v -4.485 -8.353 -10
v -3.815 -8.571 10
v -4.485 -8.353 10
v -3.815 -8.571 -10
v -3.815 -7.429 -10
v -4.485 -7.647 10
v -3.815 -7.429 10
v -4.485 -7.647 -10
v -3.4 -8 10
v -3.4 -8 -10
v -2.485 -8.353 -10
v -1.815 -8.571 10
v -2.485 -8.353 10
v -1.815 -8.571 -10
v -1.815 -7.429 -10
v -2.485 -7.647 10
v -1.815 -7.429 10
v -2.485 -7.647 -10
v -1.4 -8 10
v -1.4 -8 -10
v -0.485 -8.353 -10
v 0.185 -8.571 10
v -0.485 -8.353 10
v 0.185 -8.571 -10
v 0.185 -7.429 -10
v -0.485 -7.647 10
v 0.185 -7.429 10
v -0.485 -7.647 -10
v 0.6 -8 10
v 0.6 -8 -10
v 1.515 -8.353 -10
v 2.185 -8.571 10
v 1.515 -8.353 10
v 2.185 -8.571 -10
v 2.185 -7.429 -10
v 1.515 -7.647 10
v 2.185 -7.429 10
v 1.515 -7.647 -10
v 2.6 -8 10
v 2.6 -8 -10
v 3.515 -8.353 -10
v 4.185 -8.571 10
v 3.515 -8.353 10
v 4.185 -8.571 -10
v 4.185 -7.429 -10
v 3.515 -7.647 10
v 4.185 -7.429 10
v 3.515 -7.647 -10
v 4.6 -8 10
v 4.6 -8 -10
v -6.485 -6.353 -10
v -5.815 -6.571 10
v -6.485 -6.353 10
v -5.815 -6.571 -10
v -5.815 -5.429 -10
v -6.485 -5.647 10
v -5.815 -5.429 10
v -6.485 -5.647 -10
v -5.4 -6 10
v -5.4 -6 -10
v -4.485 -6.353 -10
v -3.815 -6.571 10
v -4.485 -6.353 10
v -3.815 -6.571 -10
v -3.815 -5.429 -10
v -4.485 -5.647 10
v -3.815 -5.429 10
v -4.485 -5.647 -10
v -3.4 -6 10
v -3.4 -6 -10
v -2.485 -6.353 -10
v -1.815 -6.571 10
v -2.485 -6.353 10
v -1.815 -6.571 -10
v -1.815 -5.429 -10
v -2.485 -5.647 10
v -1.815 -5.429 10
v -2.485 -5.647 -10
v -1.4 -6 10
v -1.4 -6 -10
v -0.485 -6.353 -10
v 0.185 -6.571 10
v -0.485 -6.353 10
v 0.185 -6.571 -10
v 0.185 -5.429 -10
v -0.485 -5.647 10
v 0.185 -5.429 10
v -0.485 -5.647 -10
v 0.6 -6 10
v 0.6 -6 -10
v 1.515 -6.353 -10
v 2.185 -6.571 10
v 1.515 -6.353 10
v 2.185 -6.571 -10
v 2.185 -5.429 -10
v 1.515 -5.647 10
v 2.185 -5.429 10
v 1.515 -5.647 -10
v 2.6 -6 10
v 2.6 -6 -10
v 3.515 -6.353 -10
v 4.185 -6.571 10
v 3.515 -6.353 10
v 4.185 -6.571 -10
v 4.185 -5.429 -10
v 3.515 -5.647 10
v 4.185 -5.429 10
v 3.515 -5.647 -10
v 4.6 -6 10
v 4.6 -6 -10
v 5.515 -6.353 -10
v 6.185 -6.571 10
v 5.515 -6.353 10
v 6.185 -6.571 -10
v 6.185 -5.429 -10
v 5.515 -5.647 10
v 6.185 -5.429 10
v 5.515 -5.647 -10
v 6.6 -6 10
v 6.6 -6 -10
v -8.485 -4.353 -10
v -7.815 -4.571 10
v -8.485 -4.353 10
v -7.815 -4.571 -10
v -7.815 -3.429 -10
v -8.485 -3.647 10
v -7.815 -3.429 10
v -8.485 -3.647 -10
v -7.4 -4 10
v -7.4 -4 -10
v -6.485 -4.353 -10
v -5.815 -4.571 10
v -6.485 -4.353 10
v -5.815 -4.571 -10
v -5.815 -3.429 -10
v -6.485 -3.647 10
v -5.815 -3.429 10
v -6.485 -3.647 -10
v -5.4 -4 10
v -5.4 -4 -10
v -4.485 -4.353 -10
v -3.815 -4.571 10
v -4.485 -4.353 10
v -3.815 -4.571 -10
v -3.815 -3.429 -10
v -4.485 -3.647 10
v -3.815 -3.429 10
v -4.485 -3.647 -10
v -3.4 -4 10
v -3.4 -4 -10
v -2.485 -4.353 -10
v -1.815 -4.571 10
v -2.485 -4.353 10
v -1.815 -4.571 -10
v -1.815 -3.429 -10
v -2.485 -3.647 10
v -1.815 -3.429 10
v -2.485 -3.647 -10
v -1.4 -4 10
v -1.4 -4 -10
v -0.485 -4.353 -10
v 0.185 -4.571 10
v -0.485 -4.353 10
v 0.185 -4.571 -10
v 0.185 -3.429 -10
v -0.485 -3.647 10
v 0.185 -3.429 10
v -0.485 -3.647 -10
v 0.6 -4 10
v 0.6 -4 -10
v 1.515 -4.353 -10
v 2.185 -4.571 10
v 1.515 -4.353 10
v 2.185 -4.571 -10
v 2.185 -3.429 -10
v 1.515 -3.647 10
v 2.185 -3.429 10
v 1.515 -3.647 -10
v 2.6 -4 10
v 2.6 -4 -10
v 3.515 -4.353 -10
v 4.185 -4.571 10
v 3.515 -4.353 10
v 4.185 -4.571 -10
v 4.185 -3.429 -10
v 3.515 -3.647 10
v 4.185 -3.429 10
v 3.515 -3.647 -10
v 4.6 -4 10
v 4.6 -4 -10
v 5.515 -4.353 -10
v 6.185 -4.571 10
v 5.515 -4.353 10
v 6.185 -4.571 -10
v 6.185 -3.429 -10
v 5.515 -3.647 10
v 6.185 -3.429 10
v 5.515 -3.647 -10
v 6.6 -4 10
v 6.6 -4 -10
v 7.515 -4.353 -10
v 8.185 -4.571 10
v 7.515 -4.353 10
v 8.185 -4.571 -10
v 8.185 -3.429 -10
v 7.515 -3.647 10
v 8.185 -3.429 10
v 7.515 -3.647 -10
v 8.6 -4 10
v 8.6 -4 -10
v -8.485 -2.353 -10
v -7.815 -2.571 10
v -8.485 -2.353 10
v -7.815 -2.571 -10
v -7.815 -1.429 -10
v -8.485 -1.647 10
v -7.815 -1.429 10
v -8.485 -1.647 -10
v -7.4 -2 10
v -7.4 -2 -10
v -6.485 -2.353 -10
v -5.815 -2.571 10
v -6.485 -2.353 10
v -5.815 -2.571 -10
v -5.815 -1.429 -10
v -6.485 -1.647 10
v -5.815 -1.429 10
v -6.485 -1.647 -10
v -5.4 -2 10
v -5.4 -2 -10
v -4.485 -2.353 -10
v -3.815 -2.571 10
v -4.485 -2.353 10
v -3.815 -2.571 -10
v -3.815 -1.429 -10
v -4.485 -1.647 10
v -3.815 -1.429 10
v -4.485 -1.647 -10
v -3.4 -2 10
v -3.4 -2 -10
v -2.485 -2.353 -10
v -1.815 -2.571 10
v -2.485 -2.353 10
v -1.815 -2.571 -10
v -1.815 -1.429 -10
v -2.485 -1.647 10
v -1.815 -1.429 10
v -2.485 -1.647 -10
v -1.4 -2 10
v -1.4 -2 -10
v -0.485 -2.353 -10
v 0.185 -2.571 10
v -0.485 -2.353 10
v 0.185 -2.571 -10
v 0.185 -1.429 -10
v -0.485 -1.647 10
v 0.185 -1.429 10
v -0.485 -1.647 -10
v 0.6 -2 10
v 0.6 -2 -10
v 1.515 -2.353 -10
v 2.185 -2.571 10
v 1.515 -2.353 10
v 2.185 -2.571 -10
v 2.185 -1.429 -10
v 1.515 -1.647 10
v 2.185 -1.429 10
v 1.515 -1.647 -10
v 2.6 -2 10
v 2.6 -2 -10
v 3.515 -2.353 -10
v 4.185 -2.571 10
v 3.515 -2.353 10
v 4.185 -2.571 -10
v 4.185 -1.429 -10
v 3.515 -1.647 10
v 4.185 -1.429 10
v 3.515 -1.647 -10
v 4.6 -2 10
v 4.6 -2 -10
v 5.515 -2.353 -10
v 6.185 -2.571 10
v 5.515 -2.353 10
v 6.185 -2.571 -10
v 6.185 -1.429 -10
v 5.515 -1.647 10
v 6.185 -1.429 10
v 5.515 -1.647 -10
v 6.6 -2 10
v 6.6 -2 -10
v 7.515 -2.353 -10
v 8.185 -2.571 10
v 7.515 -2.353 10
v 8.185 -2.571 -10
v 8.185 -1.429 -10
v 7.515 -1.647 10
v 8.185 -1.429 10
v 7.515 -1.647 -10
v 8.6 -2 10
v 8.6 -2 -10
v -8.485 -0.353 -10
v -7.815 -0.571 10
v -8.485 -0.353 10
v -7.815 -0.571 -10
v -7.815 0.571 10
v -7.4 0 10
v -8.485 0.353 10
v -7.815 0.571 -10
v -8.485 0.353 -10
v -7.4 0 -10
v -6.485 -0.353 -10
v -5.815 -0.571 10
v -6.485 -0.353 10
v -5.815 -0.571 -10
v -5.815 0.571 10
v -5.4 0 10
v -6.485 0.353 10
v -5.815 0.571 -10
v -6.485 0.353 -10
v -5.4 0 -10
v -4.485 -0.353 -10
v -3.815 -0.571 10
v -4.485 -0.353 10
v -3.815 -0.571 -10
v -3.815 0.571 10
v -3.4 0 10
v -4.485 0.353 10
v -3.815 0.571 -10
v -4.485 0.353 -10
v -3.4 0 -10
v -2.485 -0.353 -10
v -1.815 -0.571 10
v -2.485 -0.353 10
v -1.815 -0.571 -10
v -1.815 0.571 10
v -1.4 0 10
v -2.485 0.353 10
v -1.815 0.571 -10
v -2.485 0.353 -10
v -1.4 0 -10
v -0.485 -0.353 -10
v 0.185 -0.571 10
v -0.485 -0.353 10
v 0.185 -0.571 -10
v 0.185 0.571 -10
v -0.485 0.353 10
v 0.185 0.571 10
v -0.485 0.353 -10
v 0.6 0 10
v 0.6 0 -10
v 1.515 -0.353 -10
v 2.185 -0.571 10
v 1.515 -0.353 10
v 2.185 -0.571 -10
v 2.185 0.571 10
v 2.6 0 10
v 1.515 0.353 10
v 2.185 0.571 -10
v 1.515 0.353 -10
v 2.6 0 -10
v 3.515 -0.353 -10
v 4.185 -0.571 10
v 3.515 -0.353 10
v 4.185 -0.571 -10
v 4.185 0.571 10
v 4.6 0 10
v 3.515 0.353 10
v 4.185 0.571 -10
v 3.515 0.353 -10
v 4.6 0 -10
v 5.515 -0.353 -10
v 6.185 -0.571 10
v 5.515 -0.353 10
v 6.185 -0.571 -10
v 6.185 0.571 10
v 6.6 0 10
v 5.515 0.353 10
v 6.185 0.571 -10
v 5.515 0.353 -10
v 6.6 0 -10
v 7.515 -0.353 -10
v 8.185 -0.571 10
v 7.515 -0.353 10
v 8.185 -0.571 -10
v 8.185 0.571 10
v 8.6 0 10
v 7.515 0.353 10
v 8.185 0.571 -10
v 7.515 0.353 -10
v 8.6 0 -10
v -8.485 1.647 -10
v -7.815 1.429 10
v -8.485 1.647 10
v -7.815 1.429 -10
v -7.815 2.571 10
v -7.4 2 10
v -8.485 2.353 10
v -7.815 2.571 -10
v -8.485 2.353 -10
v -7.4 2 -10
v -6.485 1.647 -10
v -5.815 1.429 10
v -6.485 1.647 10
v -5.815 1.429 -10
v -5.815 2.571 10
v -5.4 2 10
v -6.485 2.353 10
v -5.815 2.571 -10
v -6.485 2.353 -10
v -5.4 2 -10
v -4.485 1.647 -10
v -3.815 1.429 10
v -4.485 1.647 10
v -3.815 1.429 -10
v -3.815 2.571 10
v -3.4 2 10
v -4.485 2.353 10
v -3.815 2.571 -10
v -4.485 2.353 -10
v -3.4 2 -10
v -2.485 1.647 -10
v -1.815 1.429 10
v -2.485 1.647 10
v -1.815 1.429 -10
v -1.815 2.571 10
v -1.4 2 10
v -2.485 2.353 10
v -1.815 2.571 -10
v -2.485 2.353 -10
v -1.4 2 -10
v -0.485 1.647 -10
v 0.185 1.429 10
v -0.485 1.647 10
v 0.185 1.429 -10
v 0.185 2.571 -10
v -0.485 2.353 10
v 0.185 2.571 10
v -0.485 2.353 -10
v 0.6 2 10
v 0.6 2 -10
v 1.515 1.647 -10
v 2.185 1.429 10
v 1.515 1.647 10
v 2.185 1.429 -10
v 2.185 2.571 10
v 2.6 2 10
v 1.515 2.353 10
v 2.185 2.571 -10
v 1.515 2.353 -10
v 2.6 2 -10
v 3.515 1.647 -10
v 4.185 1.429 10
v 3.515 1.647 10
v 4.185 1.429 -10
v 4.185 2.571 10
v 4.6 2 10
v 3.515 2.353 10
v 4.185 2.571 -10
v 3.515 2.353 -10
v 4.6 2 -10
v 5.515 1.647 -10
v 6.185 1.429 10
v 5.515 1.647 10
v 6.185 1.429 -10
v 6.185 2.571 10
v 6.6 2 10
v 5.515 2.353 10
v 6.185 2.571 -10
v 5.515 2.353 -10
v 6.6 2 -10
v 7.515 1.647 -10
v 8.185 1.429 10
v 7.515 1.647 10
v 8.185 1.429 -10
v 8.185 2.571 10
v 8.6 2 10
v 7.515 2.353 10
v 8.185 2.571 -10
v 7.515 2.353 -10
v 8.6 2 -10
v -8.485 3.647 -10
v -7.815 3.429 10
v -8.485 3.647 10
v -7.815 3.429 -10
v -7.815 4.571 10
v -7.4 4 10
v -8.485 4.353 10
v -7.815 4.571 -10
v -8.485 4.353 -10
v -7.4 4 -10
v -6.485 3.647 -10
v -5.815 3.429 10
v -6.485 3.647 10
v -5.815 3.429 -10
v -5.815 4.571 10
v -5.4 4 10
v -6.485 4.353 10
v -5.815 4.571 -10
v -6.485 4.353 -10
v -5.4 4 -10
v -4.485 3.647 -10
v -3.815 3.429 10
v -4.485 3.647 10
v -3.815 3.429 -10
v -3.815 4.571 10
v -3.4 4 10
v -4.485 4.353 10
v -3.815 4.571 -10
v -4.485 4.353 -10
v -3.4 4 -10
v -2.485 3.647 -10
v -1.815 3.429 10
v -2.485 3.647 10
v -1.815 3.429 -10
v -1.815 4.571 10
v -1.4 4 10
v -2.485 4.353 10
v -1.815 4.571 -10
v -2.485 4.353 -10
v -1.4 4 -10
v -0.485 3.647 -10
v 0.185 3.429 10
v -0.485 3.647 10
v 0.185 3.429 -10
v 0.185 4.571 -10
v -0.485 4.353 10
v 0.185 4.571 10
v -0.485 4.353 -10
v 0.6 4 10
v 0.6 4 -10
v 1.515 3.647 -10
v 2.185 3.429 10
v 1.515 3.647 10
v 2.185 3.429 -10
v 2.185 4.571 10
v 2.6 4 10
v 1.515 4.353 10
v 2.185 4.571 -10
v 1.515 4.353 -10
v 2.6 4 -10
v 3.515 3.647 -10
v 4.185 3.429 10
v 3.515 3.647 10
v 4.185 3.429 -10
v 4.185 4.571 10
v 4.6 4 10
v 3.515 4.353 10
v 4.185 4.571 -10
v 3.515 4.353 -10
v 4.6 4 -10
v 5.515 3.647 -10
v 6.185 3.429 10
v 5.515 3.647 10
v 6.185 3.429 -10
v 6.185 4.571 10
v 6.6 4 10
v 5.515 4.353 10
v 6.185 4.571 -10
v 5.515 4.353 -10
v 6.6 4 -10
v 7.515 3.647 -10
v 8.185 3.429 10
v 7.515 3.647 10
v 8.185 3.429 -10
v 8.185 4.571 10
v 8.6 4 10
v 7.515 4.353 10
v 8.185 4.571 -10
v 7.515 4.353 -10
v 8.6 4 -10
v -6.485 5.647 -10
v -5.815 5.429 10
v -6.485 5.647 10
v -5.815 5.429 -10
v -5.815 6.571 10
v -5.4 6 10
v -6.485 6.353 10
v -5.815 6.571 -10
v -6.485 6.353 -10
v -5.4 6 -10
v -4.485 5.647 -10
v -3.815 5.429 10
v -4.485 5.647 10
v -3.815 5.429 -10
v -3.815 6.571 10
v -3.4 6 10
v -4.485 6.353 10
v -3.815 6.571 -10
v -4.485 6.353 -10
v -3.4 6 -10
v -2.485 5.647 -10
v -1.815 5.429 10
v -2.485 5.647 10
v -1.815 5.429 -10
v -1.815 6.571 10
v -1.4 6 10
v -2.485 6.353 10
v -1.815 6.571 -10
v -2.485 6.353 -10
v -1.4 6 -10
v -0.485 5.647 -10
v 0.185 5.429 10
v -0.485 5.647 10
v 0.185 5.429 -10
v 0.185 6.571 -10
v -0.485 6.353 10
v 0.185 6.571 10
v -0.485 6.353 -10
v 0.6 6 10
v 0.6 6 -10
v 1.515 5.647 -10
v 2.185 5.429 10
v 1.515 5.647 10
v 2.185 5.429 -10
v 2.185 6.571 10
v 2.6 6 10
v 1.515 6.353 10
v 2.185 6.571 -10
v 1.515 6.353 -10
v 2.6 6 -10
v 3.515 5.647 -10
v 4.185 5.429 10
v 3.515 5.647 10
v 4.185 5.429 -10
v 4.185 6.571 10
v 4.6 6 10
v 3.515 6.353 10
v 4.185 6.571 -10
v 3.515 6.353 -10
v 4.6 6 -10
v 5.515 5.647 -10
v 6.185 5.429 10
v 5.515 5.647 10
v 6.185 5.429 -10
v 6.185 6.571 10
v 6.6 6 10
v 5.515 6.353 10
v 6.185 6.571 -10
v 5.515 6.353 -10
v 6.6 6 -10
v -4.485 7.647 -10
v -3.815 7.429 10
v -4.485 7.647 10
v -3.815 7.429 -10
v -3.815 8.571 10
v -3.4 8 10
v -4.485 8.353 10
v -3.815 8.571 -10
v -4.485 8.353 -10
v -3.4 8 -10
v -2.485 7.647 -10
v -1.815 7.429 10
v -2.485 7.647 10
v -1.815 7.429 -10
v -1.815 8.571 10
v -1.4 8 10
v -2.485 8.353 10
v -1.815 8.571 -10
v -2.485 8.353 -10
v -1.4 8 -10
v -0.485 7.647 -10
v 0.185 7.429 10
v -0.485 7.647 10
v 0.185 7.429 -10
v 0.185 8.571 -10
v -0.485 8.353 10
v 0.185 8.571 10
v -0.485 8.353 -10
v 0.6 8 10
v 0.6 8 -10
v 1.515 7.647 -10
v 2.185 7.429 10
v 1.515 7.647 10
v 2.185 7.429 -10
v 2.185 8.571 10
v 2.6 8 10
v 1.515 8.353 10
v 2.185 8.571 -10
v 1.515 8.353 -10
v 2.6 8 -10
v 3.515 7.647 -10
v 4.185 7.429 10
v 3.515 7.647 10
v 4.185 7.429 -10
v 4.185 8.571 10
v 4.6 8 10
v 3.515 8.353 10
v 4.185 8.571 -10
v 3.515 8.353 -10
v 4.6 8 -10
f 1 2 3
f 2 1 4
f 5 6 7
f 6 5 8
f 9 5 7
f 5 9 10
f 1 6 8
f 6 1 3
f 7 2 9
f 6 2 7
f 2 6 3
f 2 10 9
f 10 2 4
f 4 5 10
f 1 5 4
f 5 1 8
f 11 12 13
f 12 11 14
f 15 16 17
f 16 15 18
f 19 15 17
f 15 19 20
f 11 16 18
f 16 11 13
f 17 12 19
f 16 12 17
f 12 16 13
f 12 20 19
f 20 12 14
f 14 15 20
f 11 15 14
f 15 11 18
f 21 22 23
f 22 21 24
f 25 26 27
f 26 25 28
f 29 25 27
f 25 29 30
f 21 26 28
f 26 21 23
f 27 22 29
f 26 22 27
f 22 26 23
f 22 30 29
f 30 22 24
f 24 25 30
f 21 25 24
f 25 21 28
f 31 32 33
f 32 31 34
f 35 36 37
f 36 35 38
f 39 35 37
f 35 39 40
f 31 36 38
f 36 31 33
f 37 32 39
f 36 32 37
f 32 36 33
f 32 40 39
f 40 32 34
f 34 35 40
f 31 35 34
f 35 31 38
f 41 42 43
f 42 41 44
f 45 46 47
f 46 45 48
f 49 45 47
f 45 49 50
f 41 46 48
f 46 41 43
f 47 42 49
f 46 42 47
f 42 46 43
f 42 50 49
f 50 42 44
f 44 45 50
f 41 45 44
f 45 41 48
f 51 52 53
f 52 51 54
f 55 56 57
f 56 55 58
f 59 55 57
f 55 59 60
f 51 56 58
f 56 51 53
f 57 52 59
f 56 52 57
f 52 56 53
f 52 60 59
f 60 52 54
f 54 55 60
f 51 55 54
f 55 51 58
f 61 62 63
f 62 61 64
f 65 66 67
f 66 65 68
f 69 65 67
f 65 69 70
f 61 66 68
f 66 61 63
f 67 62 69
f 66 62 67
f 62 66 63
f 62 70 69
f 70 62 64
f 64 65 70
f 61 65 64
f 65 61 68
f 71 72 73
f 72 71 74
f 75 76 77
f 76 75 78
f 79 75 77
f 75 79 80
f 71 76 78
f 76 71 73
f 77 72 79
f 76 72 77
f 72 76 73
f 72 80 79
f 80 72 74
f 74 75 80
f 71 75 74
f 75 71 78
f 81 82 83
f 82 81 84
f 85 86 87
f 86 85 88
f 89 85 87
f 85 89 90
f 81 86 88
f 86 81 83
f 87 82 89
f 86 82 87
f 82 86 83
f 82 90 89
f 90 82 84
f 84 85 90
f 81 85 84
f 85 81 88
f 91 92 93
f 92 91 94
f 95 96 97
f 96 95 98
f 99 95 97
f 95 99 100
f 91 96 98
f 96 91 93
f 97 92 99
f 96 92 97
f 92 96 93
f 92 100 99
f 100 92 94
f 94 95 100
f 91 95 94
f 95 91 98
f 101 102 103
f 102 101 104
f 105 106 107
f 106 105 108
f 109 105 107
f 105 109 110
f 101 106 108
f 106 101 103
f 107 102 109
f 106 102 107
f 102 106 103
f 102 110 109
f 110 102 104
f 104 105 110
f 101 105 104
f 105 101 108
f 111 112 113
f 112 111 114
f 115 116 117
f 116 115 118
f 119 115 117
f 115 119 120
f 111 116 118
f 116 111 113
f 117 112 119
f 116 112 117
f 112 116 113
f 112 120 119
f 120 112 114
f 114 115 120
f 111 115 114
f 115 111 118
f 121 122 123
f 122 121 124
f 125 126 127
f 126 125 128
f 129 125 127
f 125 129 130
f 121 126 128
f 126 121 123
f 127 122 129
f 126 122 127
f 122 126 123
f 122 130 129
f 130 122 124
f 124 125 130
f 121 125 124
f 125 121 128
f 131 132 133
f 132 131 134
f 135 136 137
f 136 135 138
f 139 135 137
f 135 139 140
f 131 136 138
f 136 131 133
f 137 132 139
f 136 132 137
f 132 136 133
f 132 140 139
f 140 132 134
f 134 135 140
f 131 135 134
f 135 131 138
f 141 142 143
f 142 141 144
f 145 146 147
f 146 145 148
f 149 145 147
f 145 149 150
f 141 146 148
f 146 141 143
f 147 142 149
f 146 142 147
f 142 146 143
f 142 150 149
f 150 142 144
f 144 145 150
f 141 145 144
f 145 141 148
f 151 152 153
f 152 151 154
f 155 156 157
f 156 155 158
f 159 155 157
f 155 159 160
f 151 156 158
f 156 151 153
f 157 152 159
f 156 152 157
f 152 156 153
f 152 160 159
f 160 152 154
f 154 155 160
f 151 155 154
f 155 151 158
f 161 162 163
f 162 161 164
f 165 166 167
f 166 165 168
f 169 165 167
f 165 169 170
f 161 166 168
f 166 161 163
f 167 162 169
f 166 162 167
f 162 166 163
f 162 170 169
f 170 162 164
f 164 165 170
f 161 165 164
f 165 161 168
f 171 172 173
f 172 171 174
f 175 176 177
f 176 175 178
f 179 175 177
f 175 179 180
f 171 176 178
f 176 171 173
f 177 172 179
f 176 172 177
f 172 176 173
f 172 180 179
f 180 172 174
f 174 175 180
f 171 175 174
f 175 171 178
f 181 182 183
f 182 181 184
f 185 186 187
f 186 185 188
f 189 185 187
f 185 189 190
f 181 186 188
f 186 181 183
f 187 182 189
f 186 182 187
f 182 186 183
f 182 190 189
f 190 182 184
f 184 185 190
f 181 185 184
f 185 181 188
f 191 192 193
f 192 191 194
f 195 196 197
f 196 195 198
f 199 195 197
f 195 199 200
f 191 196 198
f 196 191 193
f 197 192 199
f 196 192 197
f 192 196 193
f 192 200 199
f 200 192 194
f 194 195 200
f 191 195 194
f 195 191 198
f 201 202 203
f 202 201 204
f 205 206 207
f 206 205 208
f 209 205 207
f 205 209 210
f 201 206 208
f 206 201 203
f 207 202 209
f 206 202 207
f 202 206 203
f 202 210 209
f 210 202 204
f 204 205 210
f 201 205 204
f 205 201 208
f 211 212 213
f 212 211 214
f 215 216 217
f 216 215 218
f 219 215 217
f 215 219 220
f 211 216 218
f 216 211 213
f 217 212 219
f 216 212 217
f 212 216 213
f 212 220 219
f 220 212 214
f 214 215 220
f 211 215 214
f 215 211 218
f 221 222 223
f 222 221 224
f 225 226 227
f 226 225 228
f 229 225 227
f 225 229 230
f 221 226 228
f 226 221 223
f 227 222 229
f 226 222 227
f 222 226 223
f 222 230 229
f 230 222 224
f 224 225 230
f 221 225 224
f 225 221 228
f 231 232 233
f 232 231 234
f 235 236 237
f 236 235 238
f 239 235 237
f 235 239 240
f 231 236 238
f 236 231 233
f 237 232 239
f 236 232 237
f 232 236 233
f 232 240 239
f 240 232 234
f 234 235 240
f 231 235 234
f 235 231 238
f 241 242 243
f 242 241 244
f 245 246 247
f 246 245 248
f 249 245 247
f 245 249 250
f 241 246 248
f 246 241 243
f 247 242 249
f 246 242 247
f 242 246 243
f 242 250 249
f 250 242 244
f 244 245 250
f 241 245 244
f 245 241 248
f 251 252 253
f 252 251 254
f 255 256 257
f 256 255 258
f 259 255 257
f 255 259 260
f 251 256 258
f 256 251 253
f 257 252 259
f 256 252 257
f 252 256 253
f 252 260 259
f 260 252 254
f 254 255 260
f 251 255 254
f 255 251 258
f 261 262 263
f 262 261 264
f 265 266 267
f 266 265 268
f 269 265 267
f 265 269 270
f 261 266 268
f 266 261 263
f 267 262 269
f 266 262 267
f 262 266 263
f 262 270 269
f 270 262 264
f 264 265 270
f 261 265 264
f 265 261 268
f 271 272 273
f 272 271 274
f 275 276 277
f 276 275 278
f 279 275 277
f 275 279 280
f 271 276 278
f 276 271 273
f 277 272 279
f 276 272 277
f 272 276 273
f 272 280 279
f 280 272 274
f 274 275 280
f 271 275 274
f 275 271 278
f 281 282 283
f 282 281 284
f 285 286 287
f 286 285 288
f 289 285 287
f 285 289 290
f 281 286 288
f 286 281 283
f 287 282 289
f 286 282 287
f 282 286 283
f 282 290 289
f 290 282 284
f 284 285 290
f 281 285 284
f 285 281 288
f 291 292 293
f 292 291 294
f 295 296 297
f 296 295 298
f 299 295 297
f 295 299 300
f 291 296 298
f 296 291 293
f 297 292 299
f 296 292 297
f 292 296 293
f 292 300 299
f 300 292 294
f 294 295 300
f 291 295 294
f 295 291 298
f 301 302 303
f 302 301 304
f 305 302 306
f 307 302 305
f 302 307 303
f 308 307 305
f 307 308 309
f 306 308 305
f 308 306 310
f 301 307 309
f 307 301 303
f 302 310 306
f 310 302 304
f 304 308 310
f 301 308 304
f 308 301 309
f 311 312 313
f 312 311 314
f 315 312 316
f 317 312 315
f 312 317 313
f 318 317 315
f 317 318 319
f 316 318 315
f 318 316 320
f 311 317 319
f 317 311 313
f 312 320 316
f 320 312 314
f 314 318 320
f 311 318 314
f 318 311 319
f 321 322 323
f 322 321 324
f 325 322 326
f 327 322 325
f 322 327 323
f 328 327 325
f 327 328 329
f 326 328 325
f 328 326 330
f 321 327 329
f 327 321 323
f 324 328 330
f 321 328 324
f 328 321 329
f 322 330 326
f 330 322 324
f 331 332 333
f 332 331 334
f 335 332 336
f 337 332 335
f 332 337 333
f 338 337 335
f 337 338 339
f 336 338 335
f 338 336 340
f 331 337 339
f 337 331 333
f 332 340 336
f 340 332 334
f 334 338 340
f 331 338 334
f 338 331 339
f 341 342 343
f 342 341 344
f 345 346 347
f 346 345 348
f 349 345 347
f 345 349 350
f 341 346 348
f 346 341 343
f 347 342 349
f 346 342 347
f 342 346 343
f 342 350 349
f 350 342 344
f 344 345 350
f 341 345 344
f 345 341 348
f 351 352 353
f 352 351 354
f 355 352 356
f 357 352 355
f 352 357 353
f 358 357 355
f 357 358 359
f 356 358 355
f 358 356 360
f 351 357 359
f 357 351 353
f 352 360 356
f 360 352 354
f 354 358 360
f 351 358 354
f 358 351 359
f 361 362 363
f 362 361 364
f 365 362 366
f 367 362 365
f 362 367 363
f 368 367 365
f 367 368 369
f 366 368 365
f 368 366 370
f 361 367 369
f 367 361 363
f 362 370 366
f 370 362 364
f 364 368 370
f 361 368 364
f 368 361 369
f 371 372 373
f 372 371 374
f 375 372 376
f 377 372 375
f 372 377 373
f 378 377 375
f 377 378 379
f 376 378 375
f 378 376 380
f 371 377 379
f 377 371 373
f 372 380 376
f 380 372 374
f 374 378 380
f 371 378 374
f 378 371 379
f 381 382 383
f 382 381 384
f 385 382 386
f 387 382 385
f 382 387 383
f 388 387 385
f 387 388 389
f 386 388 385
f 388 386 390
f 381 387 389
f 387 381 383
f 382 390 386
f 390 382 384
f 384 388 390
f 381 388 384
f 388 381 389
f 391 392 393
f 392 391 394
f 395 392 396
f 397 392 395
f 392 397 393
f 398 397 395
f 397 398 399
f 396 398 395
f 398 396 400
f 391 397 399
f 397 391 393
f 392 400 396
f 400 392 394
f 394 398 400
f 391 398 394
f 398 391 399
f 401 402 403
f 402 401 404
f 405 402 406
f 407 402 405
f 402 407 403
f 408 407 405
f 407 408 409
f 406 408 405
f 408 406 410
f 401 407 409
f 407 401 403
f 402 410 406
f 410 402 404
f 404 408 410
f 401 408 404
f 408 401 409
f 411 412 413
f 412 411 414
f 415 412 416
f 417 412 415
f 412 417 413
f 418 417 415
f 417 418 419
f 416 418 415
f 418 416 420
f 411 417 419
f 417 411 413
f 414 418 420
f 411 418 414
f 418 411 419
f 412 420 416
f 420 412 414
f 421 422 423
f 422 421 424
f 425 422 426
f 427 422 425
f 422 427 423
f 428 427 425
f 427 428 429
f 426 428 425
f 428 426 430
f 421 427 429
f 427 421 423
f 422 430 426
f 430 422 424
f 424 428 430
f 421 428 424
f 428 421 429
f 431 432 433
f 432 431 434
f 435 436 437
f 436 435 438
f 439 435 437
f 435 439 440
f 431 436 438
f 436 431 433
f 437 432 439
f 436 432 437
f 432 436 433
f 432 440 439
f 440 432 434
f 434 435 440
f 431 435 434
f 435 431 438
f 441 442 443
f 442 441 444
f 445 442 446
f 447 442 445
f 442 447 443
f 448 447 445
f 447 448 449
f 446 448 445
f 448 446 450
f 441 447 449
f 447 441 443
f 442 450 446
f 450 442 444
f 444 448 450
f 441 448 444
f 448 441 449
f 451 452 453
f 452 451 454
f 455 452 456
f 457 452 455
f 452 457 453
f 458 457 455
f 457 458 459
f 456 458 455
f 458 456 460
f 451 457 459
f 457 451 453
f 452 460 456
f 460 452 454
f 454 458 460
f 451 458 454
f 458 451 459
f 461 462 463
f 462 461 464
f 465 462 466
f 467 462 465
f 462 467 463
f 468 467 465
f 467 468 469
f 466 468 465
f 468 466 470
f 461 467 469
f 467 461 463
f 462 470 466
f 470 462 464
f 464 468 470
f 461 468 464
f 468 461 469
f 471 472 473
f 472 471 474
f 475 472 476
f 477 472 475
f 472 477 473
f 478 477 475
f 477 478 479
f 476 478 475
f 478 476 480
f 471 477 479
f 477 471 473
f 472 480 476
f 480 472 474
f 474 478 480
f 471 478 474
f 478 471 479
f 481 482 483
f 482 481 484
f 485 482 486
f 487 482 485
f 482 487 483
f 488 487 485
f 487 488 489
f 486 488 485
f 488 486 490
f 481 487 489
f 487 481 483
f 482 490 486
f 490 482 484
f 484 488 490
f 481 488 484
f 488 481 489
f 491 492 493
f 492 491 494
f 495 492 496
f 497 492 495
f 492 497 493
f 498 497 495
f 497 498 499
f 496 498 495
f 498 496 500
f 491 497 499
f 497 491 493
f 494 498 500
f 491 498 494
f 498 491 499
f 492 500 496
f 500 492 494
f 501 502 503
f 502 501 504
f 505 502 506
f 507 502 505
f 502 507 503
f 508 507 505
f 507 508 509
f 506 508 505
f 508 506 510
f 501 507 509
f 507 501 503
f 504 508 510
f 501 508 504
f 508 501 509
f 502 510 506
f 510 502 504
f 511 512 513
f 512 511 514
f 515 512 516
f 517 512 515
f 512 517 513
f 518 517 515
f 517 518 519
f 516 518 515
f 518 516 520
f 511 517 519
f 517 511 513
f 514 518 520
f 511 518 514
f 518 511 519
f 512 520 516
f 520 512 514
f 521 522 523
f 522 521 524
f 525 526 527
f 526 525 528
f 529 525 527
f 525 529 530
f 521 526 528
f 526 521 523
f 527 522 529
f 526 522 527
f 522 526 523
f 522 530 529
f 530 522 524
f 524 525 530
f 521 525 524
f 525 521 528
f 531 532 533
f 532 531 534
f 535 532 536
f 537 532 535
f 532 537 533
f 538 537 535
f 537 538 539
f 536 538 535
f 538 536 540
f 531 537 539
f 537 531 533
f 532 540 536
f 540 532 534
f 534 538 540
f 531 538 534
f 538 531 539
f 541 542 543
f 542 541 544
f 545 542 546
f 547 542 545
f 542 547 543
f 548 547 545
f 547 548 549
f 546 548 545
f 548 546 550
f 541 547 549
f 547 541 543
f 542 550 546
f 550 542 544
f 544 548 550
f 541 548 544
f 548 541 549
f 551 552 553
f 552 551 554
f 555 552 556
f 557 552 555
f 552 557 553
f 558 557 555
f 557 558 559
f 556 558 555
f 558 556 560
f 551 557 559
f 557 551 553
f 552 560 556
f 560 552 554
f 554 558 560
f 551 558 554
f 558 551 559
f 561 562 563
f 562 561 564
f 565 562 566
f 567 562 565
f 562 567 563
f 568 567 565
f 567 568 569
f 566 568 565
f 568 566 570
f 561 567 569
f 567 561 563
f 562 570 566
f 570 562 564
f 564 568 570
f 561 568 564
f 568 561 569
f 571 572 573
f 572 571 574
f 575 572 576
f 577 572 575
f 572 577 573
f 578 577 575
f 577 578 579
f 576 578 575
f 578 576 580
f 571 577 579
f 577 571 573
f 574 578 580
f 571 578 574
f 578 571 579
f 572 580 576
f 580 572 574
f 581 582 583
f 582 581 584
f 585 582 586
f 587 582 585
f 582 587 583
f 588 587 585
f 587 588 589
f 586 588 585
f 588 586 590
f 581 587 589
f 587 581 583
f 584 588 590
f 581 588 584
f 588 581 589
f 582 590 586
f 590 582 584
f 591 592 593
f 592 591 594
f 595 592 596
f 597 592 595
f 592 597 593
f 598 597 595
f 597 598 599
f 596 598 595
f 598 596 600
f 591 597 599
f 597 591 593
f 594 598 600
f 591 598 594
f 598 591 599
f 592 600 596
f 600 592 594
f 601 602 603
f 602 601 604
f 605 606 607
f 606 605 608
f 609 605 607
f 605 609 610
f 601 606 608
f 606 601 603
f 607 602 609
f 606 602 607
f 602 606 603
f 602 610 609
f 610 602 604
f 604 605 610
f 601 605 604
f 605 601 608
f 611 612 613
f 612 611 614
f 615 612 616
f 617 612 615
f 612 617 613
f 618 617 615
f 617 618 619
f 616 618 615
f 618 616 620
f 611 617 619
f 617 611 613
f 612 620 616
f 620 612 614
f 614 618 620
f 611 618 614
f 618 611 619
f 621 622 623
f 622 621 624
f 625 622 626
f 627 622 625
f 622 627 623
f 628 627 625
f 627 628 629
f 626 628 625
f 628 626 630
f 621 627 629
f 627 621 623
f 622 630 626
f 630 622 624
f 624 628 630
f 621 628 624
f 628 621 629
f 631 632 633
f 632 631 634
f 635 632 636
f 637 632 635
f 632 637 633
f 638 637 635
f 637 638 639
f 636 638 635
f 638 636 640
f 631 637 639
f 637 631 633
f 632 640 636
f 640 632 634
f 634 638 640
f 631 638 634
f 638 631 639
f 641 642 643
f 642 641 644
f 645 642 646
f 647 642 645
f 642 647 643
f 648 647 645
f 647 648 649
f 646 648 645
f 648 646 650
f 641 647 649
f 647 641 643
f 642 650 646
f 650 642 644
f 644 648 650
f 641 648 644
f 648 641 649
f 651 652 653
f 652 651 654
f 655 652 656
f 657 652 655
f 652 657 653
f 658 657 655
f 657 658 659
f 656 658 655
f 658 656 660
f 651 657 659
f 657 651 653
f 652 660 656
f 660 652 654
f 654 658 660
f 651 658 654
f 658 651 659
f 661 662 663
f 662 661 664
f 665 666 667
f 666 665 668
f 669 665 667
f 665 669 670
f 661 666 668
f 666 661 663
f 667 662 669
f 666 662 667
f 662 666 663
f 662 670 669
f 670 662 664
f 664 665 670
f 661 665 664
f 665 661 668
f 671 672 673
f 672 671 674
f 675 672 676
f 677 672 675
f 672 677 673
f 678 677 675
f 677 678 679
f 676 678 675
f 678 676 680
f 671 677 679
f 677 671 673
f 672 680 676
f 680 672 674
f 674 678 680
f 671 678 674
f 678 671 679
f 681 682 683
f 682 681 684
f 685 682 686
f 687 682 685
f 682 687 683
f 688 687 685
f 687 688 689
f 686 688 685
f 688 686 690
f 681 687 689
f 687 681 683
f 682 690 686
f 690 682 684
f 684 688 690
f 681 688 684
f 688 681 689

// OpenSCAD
// speaker venting holes
// Use with a difference to put holes in a case wall for sound
// Increase the optional density arg for more, smaller holes
//$fn = 20;

// If the distance is less than the radius of the circle, then
//  the point lies inside the circle
function dist(x, y) = sqrt(x*x + y*y);

module speakerGrid(d, density=20, size_mult=1.2, center=true) {
  hole_size = d/density;
  for (y = [-d/2:hole_size*2:d/2]) {
    for (x = [-d/2:hole_size*2:d/2]) {
      if (dist(x, y) < d/2) {
        translate([x, y, 0])
          cylinder(h=d, d=hole_size*size_mult, center=center);
      }
    }
  }
}

speakerGrid(20);
